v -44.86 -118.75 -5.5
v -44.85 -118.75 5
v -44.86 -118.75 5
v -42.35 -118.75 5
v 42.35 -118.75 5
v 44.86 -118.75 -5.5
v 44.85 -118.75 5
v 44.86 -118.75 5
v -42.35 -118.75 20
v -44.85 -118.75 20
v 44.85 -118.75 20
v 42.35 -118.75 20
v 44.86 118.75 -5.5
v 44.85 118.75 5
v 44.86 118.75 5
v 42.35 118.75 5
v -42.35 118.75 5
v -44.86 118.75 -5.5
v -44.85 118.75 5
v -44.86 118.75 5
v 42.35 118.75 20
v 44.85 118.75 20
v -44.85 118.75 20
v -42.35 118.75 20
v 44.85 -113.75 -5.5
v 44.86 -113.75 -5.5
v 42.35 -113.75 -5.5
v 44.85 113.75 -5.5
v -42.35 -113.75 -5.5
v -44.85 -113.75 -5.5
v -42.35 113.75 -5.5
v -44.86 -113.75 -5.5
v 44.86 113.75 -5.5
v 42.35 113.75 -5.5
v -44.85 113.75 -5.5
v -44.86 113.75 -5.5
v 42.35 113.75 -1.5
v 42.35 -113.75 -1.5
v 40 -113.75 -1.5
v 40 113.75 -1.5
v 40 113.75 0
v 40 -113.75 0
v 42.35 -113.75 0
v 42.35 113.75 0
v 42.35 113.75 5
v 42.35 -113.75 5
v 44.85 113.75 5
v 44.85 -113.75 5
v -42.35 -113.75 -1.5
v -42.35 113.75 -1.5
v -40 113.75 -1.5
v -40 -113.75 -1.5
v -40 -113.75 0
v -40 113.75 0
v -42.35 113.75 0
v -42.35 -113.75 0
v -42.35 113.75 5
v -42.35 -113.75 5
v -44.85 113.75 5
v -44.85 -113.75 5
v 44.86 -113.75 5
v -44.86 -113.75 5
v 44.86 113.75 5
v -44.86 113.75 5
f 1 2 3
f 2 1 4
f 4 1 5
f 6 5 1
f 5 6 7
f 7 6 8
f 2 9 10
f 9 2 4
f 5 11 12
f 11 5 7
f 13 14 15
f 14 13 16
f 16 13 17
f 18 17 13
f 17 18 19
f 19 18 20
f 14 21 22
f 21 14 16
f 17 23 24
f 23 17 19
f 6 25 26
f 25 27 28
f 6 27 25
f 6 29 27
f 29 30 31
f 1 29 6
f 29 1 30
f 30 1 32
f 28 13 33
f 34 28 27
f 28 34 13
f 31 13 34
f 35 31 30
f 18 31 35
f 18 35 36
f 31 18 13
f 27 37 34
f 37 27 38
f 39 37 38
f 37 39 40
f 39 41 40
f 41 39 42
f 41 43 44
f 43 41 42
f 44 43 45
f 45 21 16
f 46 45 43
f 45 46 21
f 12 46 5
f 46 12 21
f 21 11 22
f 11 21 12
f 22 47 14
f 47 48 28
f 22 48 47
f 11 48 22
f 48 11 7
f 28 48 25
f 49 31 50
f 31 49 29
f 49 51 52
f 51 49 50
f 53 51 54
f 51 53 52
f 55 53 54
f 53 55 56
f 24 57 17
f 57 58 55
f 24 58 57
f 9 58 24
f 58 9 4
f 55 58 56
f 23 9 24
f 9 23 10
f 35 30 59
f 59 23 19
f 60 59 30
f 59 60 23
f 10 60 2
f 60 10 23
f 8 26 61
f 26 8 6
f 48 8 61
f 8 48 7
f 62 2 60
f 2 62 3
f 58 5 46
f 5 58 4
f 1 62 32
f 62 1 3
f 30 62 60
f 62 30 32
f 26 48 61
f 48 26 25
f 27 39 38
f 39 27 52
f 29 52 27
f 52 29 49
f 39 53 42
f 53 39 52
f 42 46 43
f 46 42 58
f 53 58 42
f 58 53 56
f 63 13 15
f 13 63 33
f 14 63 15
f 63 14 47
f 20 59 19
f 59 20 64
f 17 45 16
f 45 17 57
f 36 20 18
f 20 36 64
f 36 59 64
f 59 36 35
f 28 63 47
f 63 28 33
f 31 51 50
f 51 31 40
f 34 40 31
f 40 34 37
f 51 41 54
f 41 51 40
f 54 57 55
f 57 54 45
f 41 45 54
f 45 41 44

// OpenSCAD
// file: owon_tray_common.scad
// owon_tray_common.scad — shared dimensions for the OWON SPM8104 top tray.
//
// Measured on the actual unit (the datasheet's 82 mm width is WRONG):
//   lid width  84.30 mm  (calipers)
//   lid length ~226 mm   (flat all the way to the plastic front bezel)
//   height     142 mm    (spec)
//   venting    rear fan + side slots low on the case — skirts stay well above
//
// The 84.30 mm width is the happy accident that makes this work: a 2-cell
// Clickfinity plate is exactly 84.00 mm, so it sits flush with ~0.15 mm of case
// showing per side. 5 cells (210 mm) fits the length with ~16 mm to spare.

/* [Case] */
CASE_W   = 84.30;  // measured lid width
CASE_CLR = 0.40;   // total slip clearance across the WIDTH. Confirmed on the
                   //   printed part — the width fit is fine, leave it alone.
CASE_L   = 226.00; // measured lid LENGTH, rear edge -> front bezel. THE frame
                   //   must clear this between its end lips. CONFIRM BY HAND
                   //   before printing — see the note on RAIL_LEN below.
CASE_L_CLR = 1.50; // total slip clearance along the LENGTH. Generous on purpose:
                   //   a little front-to-back slide is fine, seizing is not.

/* [Tray] */
GX = 2;            // cells across (84.00 mm — flush on the lid)
GY = 5;            // cells deep  (210 mm)
PLATE_H_ = 4.00;   // must match PLATE_H in lib/clickfinity.scad

/* [Clamp rail] */
SKIRT_T     = 2.50;  // skirt wall thickness
SKIRT_D     = 20.0;  // how far the skirt drops down the case side.
                     //   Keep SHORT — the side vents sit lower down the case.
// NOTE: the rail supports the plate from BELOW, it does not hook over it.
// A Gridfinity bin is 41.5 mm in a 42 mm cell — only 0.25 mm of plate rim per
// side. There is nothing to clamp over: any inward flange lands on top of the
// outer-row bins and stops them seating. So: a lip under the plate edge, and an
// upstand beside it.
LIP_IN   = 2.00;   // how far the lip reaches inward under the plate edge
LIP_T    = 1.50;   // lip thickness — the plate rides this far above the lid

// RAIL_LEN is DERIVED (see bottom) — do not hand-set it.
//
// v1.0.3 shipped MOUNT_L = 228 as the frame's OUTER length, sized against the
// ~9" case. That was the wrong end of the part: the two end-bars eat END_BAR_T
// each, so the CLEAR SPAN the case actually has to fit into was only
// 228 - 2*5 = 218 mm, against a 226 mm case. The end lips came down flat on the
// case top ~4 mm in from each end and the frame perched instead of dropping over.
//
// The clear span is now driven by CASE_L, and the end-bars are added OUTSIDE it,
// so the lips land past the case edges by construction.

/* [Front/back end-bars] */
// The two side jaws are TIED TOGETHER by a bar across each end — this is what
// makes the screw clamp work at all: the bar carries the screw reaction from one
// jaw to the other (closed loop). Without it, a side screw just shoves its own
// jaw off the case. Each bar also carries a SHALLOW downturn lip that hooks the
// front/back top edge (short, so it clears the front display / rear fan).
END_BAR_T = 5.00;  // [3:0.5:10] end-bar thickness along the length (rigidity)
END_LIP_D = 5.00;  // [3:0.5:12] how far the front/back lip drops over the edge

// (No clamp hardware — this is a passive drop-over frame. Side walls hug the
// case, front/back lips stop the slide, gravity holds it down. The plate is
// permanent — you swap BINS, not the plate — so it's simply bonded into the
// frame at assembly. No retention mechanism needed.)

// Derived
PLATE_W  = GX*42;
PLATE_L  = GY*42;
SKIRT_IN = CASE_W/2 + CASE_CLR/2;   // inner face of the skirt
SKIRT_OUT= SKIRT_IN + SKIRT_T;

INNER_L  = CASE_L + CASE_L_CLR;     // clear span between the end lips
RAIL_LEN = INNER_L + 2*END_BAR_T;   // overall frame length
MOUNT_L  = RAIL_LEN;                // back-compat alias; RAIL_LEN is the truth
// main file
// owon_tray_frame.scad — one-piece drop-over frame for the OWON SPM8104 tray.
//
// Part 1 of 2 (the stock Clickfinity plate drops into it). **Print ONE.**
//
// NO CLAMP, NO HARDWARE. For a coiled cord and some barrel adapters on a supply
// that never moves, retention is passive: the side walls hug the case sides so
// it can't slide off sideways, the shallow front/back lips catch the top edges
// so it can't slide off front/back, and gravity holds it down. It drops on and
// lifts off. (An earlier version added a screw clamp — pointless overkill for
// this load, and mechanically wrong besides.)
//
// PRINT: flat, WALLS UP — the file already rotates it (see the bottom). Bed
// contact is the frame outline + end-bars; the only overhang is the ~2.3 mm
// inner lip, which bridges. NO SUPPORTS — the slicer will try to fill the frame
// interior for that lip; turn them off.
// PETG or PLA — this part carries no load and isn't a spring.

include <owon_tray_common.scad>
$fn = 48;

_TOP = LIP_T + PLATE_H_;

// One side jaw's cross-section (x,z): lip under the plate edge, upstand that
// captures the plate, and the 20 mm skirt down the case side.
function _jaw_profile() = [
    [PLATE_W/2 - LIP_IN,  0],
    [PLATE_W/2 - LIP_IN,  LIP_T],
    [SKIRT_IN,            LIP_T],
    [SKIRT_IN,            _TOP],
    [SKIRT_OUT,           _TOP],
    [SKIRT_OUT,          -SKIRT_D],
    [SKIRT_IN,           -SKIRT_D],
    [SKIRT_IN,            0],
];

// One side wall (+X side): just the extruded hook — lip under the plate, upstand
// that captures the plate, and the skirt that hugs the case side. No bosses.
module _jaw() {
    translate([0, RAIL_LEN/2, 0]) rotate([90,0,0])
        linear_extrude(RAIL_LEN) polygon(_jaw_profile());
}

// Front/back end-bar: spans the full width and fuses into BOTH jaws, closing the
// frame (the reaction path). Also carries the shallow front/back lip: from the
// jaw top (_TOP) down over the front/back edge by END_LIP_D. Overlaps the jaws
// (+/-0.01) so it merges without coincident planes.
module _end_bar(s) {
    y0 = s > 0 ? RAIL_LEN/2 - END_BAR_T : -RAIL_LEN/2;
    translate([-SKIRT_OUT - 0.01, y0, -END_LIP_D])
        cube([2*SKIRT_OUT + 0.02, END_BAR_T, END_LIP_D + _TOP]);
}

// The complete one-piece frame (modelled as-used: walls down).
module frame() {
    _jaw();
    mirror([1,0,0]) _jaw();
    _end_bar(1);
    _end_bar(-1);
}

// Rendered WALLS-UP for printing: the frame outline + end-bars sit on the bed,
// walls rise, and the only overhang is the ~2.3 mm inner lip (bridges — NO
// supports). Flip back walls-down to use it on the unit.
rotate([180, 0, 0]) frame();
